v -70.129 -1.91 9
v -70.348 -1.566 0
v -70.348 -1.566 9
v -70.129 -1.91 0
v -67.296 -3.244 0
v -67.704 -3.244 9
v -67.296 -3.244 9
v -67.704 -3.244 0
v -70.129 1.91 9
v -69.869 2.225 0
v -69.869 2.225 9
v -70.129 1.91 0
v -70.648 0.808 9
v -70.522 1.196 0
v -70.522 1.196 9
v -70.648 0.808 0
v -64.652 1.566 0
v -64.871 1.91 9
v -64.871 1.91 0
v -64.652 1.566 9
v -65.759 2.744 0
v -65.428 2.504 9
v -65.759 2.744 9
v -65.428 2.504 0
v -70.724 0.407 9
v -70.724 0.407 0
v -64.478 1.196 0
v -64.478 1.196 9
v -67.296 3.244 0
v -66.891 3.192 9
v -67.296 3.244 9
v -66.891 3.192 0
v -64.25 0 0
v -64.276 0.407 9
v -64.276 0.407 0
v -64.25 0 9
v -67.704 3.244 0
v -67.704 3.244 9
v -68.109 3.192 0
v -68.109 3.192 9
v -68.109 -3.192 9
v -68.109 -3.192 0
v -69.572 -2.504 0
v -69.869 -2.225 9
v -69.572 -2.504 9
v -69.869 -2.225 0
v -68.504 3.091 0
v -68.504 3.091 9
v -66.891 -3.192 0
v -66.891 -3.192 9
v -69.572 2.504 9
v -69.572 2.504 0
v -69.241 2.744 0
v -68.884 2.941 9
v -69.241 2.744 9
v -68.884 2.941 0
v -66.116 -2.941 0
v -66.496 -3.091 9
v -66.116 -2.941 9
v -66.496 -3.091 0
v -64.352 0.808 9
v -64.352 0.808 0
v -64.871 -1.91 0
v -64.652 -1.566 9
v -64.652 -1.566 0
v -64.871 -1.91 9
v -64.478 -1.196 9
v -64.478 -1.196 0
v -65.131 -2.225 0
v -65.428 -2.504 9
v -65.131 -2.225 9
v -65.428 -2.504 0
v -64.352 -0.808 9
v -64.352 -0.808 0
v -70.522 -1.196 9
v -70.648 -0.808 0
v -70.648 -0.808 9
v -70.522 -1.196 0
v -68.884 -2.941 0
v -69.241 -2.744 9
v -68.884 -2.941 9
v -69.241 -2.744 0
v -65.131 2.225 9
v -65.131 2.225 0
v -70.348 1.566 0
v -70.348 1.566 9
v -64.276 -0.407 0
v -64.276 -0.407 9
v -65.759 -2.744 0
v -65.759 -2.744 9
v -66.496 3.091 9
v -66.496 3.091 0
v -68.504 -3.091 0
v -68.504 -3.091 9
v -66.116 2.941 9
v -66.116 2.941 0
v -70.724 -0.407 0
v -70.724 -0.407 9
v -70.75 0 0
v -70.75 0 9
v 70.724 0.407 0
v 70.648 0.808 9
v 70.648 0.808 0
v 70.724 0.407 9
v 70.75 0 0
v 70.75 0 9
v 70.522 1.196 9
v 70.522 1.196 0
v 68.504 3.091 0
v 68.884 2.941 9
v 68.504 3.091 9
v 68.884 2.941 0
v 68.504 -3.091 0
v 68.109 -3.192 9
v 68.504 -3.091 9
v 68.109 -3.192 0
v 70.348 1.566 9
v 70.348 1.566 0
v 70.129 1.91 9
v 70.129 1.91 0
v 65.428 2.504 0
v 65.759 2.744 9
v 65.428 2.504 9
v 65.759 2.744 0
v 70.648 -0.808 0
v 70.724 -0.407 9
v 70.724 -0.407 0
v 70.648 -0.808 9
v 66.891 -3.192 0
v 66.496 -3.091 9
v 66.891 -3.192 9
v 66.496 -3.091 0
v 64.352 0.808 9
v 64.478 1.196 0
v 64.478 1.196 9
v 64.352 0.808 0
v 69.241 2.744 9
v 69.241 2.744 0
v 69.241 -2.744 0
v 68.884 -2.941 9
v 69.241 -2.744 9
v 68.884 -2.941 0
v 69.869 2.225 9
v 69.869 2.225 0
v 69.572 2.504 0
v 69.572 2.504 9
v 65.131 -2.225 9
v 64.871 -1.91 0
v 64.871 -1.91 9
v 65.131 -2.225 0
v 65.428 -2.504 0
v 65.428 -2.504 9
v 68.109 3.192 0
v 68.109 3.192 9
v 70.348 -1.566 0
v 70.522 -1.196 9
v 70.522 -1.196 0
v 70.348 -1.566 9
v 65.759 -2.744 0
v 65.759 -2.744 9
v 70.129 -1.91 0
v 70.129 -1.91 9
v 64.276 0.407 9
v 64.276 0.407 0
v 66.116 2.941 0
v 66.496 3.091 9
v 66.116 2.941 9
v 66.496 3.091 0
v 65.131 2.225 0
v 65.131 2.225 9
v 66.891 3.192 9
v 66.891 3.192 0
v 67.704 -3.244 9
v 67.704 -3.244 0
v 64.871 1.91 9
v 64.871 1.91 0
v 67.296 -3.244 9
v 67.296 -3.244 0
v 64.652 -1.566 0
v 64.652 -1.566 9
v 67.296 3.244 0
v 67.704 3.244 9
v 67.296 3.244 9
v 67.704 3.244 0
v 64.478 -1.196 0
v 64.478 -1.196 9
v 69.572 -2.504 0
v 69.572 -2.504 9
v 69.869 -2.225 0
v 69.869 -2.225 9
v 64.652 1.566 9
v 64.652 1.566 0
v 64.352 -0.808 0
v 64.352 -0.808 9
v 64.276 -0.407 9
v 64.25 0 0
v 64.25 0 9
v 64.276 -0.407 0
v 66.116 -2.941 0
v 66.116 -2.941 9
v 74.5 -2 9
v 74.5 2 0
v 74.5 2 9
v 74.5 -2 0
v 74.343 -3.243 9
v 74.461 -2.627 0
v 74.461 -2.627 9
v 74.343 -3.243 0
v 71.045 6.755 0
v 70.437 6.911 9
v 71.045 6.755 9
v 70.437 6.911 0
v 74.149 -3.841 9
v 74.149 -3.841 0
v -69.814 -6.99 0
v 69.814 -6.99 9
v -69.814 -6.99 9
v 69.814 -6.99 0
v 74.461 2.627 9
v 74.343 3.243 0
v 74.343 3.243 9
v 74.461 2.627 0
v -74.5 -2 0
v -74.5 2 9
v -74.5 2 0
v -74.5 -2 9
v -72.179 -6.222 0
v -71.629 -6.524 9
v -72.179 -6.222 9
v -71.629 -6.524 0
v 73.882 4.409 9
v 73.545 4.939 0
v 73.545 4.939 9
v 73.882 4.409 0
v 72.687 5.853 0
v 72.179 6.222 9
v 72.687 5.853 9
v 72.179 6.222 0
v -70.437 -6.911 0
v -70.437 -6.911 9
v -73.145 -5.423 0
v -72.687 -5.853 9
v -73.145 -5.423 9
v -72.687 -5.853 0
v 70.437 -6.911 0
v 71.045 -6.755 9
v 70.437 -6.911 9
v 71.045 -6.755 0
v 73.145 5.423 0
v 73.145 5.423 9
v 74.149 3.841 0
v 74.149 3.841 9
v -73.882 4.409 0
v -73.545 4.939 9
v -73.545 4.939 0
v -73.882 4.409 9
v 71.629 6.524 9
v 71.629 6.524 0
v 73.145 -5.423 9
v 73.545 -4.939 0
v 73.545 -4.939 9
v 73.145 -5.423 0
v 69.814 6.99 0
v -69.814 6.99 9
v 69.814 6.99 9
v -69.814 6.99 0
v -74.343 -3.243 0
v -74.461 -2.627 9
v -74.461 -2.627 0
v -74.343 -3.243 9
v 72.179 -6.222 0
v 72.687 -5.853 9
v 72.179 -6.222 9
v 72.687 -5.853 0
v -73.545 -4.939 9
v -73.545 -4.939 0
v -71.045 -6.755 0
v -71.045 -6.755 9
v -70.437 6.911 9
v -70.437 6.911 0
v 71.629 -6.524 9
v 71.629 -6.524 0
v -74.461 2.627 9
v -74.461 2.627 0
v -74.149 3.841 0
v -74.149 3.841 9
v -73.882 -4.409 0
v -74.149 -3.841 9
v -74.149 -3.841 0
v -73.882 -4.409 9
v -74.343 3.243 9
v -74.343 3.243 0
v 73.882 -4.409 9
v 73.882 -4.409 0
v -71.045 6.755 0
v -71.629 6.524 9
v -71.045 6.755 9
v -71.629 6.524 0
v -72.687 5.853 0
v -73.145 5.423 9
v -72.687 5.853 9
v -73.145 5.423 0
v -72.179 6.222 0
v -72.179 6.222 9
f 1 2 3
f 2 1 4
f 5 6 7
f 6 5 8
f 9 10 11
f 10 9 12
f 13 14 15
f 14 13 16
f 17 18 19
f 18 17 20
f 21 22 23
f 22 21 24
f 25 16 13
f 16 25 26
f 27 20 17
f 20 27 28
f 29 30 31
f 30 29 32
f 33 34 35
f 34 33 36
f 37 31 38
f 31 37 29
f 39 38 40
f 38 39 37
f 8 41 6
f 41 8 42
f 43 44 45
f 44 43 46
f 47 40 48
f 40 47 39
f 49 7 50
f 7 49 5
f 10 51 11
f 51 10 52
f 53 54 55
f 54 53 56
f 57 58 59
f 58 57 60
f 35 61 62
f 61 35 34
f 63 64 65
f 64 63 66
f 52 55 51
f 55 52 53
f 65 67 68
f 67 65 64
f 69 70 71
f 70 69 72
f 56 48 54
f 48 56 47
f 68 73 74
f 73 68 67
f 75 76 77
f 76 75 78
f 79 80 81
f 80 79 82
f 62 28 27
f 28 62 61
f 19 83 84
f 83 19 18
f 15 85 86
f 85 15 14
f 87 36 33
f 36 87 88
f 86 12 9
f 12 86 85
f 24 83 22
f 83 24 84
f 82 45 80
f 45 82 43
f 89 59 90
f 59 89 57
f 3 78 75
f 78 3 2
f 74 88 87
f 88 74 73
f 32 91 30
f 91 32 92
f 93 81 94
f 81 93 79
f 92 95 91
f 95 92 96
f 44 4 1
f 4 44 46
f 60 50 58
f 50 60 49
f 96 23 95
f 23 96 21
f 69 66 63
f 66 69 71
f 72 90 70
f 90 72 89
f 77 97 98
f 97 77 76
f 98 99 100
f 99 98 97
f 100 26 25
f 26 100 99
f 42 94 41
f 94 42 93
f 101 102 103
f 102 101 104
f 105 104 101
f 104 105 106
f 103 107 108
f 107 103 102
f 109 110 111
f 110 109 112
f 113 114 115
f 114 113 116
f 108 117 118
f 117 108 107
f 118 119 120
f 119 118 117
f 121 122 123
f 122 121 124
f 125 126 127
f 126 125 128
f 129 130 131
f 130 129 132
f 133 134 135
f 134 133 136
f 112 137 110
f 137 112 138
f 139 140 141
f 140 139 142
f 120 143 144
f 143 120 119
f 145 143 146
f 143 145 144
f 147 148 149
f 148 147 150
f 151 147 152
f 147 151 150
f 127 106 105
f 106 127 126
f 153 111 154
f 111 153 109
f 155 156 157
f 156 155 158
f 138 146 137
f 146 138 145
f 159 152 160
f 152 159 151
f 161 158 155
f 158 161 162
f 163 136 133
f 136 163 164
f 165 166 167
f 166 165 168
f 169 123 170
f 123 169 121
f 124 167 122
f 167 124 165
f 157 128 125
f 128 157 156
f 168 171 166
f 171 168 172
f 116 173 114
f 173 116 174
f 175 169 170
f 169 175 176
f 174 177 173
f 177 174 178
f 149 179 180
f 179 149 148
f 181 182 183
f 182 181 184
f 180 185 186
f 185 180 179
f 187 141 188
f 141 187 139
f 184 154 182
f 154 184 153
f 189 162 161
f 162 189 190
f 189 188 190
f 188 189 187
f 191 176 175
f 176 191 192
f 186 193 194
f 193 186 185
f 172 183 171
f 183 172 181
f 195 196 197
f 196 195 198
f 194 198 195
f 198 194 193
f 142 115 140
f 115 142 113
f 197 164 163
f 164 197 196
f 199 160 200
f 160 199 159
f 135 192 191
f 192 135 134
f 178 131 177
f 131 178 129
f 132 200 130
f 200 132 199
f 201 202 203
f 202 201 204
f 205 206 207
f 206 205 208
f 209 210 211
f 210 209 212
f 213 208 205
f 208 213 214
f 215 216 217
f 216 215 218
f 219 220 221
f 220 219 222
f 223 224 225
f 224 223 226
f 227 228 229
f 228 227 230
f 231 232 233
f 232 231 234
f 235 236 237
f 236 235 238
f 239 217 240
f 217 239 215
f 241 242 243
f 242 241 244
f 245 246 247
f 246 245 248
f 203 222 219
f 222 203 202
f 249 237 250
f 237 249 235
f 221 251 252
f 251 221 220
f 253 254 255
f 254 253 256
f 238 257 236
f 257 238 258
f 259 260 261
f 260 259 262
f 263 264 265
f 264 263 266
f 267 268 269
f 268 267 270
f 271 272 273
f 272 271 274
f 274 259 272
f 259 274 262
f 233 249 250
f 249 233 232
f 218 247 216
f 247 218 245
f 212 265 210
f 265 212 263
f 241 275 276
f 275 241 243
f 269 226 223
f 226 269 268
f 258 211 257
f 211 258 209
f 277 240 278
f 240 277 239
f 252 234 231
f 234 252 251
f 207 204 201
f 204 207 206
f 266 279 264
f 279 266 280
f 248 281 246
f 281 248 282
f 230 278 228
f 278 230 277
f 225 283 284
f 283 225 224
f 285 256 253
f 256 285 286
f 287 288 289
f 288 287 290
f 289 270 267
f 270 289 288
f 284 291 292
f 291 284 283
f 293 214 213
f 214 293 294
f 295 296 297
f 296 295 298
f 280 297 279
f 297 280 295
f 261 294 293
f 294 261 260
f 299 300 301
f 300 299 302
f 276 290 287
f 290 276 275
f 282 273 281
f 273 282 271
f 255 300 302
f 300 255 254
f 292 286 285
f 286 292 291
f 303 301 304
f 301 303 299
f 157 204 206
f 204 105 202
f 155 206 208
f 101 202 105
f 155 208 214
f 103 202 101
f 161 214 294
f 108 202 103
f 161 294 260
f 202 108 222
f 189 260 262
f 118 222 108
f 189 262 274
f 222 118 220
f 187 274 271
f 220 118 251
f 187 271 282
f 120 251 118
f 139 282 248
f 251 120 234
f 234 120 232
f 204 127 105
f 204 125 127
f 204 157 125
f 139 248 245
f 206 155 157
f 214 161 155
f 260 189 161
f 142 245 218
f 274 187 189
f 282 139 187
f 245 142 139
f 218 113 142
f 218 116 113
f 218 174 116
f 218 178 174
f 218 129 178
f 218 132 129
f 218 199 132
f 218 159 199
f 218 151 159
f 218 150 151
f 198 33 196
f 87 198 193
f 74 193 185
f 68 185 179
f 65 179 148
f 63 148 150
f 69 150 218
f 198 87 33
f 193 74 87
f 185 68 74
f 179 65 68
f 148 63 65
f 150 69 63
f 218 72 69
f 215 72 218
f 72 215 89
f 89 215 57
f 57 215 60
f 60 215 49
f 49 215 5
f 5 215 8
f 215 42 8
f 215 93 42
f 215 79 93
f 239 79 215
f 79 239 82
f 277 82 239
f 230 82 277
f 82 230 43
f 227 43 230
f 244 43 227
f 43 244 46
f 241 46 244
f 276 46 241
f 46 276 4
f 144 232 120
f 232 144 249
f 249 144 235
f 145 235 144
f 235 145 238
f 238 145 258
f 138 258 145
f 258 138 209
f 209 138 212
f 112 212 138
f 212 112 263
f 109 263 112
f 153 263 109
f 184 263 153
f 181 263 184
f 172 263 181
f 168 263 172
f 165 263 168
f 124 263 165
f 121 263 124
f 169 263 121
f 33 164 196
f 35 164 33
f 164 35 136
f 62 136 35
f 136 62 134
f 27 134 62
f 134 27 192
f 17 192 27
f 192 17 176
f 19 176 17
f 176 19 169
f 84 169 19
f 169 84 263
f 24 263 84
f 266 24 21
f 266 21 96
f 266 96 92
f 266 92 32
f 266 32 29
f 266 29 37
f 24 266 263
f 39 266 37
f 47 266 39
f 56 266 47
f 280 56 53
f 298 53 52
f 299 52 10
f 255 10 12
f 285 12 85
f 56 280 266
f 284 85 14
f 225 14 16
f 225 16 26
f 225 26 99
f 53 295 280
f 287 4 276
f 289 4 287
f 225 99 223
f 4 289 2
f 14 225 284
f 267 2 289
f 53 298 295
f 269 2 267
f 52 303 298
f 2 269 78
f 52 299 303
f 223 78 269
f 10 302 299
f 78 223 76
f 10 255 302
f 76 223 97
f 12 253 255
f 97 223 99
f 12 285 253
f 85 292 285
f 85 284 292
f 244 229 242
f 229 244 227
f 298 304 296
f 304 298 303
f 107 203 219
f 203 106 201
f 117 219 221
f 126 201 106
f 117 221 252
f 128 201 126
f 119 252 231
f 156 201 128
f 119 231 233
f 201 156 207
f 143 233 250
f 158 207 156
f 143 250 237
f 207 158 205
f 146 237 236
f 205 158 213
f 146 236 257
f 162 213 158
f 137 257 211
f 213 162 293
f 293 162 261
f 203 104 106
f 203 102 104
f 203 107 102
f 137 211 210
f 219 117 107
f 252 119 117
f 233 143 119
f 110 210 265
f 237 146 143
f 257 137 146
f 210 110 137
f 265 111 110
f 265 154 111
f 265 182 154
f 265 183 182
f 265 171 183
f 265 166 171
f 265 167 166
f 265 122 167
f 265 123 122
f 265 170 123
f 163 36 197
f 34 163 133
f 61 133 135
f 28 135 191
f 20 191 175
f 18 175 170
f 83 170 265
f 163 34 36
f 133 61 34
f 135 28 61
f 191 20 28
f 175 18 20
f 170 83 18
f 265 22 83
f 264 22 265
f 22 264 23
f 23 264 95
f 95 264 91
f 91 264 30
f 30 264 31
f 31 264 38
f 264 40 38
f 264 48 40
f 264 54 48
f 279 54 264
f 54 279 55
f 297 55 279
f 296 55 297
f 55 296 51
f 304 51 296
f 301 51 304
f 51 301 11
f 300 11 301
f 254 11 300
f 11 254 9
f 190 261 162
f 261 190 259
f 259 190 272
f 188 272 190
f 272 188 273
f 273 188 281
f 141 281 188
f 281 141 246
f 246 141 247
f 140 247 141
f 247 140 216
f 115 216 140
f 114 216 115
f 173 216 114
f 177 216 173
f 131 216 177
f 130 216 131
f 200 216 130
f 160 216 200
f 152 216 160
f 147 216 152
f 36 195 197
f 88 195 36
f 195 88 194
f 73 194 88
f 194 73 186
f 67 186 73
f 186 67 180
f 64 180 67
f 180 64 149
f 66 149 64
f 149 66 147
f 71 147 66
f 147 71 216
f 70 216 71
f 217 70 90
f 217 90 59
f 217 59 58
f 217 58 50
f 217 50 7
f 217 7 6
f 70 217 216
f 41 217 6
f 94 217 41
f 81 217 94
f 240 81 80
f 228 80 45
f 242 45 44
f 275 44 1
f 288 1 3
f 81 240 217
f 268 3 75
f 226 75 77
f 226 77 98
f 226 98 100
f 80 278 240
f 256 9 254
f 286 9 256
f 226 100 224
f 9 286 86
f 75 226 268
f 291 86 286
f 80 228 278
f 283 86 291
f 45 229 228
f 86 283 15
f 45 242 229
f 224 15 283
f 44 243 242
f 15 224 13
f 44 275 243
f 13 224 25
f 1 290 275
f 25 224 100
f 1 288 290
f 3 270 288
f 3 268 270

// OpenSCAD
$fn = 50;


difference() {
	union() {
		hull() {
			translate(v = [-69.5000000000, 2.0000000000, 0]) {
				cylinder(h = 9, r = 5);
			}
			translate(v = [69.5000000000, 2.0000000000, 0]) {
				cylinder(h = 9, r = 5);
			}
			translate(v = [-69.5000000000, -2.0000000000, 0]) {
				cylinder(h = 9, r = 5);
			}
			translate(v = [69.5000000000, -2.0000000000, 0]) {
				cylinder(h = 9, r = 5);
			}
		}
	}
	union() {
		translate(v = [-67.5000000000, 0.0000000000, -100.0000000000]) {
			cylinder(h = 200, r = 3.2500000000);
		}
		translate(v = [-67.5000000000, 0.0000000000, -100.0000000000]) {
			cylinder(h = 200, r = 3.2500000000);
		}
		translate(v = [67.5000000000, 0.0000000000, -100.0000000000]) {
			cylinder(h = 200, r = 3.2500000000);
		}
		translate(v = [67.5000000000, 0.0000000000, -100.0000000000]) {
			cylinder(h = 200, r = 3.2500000000);
		}
	}
}
